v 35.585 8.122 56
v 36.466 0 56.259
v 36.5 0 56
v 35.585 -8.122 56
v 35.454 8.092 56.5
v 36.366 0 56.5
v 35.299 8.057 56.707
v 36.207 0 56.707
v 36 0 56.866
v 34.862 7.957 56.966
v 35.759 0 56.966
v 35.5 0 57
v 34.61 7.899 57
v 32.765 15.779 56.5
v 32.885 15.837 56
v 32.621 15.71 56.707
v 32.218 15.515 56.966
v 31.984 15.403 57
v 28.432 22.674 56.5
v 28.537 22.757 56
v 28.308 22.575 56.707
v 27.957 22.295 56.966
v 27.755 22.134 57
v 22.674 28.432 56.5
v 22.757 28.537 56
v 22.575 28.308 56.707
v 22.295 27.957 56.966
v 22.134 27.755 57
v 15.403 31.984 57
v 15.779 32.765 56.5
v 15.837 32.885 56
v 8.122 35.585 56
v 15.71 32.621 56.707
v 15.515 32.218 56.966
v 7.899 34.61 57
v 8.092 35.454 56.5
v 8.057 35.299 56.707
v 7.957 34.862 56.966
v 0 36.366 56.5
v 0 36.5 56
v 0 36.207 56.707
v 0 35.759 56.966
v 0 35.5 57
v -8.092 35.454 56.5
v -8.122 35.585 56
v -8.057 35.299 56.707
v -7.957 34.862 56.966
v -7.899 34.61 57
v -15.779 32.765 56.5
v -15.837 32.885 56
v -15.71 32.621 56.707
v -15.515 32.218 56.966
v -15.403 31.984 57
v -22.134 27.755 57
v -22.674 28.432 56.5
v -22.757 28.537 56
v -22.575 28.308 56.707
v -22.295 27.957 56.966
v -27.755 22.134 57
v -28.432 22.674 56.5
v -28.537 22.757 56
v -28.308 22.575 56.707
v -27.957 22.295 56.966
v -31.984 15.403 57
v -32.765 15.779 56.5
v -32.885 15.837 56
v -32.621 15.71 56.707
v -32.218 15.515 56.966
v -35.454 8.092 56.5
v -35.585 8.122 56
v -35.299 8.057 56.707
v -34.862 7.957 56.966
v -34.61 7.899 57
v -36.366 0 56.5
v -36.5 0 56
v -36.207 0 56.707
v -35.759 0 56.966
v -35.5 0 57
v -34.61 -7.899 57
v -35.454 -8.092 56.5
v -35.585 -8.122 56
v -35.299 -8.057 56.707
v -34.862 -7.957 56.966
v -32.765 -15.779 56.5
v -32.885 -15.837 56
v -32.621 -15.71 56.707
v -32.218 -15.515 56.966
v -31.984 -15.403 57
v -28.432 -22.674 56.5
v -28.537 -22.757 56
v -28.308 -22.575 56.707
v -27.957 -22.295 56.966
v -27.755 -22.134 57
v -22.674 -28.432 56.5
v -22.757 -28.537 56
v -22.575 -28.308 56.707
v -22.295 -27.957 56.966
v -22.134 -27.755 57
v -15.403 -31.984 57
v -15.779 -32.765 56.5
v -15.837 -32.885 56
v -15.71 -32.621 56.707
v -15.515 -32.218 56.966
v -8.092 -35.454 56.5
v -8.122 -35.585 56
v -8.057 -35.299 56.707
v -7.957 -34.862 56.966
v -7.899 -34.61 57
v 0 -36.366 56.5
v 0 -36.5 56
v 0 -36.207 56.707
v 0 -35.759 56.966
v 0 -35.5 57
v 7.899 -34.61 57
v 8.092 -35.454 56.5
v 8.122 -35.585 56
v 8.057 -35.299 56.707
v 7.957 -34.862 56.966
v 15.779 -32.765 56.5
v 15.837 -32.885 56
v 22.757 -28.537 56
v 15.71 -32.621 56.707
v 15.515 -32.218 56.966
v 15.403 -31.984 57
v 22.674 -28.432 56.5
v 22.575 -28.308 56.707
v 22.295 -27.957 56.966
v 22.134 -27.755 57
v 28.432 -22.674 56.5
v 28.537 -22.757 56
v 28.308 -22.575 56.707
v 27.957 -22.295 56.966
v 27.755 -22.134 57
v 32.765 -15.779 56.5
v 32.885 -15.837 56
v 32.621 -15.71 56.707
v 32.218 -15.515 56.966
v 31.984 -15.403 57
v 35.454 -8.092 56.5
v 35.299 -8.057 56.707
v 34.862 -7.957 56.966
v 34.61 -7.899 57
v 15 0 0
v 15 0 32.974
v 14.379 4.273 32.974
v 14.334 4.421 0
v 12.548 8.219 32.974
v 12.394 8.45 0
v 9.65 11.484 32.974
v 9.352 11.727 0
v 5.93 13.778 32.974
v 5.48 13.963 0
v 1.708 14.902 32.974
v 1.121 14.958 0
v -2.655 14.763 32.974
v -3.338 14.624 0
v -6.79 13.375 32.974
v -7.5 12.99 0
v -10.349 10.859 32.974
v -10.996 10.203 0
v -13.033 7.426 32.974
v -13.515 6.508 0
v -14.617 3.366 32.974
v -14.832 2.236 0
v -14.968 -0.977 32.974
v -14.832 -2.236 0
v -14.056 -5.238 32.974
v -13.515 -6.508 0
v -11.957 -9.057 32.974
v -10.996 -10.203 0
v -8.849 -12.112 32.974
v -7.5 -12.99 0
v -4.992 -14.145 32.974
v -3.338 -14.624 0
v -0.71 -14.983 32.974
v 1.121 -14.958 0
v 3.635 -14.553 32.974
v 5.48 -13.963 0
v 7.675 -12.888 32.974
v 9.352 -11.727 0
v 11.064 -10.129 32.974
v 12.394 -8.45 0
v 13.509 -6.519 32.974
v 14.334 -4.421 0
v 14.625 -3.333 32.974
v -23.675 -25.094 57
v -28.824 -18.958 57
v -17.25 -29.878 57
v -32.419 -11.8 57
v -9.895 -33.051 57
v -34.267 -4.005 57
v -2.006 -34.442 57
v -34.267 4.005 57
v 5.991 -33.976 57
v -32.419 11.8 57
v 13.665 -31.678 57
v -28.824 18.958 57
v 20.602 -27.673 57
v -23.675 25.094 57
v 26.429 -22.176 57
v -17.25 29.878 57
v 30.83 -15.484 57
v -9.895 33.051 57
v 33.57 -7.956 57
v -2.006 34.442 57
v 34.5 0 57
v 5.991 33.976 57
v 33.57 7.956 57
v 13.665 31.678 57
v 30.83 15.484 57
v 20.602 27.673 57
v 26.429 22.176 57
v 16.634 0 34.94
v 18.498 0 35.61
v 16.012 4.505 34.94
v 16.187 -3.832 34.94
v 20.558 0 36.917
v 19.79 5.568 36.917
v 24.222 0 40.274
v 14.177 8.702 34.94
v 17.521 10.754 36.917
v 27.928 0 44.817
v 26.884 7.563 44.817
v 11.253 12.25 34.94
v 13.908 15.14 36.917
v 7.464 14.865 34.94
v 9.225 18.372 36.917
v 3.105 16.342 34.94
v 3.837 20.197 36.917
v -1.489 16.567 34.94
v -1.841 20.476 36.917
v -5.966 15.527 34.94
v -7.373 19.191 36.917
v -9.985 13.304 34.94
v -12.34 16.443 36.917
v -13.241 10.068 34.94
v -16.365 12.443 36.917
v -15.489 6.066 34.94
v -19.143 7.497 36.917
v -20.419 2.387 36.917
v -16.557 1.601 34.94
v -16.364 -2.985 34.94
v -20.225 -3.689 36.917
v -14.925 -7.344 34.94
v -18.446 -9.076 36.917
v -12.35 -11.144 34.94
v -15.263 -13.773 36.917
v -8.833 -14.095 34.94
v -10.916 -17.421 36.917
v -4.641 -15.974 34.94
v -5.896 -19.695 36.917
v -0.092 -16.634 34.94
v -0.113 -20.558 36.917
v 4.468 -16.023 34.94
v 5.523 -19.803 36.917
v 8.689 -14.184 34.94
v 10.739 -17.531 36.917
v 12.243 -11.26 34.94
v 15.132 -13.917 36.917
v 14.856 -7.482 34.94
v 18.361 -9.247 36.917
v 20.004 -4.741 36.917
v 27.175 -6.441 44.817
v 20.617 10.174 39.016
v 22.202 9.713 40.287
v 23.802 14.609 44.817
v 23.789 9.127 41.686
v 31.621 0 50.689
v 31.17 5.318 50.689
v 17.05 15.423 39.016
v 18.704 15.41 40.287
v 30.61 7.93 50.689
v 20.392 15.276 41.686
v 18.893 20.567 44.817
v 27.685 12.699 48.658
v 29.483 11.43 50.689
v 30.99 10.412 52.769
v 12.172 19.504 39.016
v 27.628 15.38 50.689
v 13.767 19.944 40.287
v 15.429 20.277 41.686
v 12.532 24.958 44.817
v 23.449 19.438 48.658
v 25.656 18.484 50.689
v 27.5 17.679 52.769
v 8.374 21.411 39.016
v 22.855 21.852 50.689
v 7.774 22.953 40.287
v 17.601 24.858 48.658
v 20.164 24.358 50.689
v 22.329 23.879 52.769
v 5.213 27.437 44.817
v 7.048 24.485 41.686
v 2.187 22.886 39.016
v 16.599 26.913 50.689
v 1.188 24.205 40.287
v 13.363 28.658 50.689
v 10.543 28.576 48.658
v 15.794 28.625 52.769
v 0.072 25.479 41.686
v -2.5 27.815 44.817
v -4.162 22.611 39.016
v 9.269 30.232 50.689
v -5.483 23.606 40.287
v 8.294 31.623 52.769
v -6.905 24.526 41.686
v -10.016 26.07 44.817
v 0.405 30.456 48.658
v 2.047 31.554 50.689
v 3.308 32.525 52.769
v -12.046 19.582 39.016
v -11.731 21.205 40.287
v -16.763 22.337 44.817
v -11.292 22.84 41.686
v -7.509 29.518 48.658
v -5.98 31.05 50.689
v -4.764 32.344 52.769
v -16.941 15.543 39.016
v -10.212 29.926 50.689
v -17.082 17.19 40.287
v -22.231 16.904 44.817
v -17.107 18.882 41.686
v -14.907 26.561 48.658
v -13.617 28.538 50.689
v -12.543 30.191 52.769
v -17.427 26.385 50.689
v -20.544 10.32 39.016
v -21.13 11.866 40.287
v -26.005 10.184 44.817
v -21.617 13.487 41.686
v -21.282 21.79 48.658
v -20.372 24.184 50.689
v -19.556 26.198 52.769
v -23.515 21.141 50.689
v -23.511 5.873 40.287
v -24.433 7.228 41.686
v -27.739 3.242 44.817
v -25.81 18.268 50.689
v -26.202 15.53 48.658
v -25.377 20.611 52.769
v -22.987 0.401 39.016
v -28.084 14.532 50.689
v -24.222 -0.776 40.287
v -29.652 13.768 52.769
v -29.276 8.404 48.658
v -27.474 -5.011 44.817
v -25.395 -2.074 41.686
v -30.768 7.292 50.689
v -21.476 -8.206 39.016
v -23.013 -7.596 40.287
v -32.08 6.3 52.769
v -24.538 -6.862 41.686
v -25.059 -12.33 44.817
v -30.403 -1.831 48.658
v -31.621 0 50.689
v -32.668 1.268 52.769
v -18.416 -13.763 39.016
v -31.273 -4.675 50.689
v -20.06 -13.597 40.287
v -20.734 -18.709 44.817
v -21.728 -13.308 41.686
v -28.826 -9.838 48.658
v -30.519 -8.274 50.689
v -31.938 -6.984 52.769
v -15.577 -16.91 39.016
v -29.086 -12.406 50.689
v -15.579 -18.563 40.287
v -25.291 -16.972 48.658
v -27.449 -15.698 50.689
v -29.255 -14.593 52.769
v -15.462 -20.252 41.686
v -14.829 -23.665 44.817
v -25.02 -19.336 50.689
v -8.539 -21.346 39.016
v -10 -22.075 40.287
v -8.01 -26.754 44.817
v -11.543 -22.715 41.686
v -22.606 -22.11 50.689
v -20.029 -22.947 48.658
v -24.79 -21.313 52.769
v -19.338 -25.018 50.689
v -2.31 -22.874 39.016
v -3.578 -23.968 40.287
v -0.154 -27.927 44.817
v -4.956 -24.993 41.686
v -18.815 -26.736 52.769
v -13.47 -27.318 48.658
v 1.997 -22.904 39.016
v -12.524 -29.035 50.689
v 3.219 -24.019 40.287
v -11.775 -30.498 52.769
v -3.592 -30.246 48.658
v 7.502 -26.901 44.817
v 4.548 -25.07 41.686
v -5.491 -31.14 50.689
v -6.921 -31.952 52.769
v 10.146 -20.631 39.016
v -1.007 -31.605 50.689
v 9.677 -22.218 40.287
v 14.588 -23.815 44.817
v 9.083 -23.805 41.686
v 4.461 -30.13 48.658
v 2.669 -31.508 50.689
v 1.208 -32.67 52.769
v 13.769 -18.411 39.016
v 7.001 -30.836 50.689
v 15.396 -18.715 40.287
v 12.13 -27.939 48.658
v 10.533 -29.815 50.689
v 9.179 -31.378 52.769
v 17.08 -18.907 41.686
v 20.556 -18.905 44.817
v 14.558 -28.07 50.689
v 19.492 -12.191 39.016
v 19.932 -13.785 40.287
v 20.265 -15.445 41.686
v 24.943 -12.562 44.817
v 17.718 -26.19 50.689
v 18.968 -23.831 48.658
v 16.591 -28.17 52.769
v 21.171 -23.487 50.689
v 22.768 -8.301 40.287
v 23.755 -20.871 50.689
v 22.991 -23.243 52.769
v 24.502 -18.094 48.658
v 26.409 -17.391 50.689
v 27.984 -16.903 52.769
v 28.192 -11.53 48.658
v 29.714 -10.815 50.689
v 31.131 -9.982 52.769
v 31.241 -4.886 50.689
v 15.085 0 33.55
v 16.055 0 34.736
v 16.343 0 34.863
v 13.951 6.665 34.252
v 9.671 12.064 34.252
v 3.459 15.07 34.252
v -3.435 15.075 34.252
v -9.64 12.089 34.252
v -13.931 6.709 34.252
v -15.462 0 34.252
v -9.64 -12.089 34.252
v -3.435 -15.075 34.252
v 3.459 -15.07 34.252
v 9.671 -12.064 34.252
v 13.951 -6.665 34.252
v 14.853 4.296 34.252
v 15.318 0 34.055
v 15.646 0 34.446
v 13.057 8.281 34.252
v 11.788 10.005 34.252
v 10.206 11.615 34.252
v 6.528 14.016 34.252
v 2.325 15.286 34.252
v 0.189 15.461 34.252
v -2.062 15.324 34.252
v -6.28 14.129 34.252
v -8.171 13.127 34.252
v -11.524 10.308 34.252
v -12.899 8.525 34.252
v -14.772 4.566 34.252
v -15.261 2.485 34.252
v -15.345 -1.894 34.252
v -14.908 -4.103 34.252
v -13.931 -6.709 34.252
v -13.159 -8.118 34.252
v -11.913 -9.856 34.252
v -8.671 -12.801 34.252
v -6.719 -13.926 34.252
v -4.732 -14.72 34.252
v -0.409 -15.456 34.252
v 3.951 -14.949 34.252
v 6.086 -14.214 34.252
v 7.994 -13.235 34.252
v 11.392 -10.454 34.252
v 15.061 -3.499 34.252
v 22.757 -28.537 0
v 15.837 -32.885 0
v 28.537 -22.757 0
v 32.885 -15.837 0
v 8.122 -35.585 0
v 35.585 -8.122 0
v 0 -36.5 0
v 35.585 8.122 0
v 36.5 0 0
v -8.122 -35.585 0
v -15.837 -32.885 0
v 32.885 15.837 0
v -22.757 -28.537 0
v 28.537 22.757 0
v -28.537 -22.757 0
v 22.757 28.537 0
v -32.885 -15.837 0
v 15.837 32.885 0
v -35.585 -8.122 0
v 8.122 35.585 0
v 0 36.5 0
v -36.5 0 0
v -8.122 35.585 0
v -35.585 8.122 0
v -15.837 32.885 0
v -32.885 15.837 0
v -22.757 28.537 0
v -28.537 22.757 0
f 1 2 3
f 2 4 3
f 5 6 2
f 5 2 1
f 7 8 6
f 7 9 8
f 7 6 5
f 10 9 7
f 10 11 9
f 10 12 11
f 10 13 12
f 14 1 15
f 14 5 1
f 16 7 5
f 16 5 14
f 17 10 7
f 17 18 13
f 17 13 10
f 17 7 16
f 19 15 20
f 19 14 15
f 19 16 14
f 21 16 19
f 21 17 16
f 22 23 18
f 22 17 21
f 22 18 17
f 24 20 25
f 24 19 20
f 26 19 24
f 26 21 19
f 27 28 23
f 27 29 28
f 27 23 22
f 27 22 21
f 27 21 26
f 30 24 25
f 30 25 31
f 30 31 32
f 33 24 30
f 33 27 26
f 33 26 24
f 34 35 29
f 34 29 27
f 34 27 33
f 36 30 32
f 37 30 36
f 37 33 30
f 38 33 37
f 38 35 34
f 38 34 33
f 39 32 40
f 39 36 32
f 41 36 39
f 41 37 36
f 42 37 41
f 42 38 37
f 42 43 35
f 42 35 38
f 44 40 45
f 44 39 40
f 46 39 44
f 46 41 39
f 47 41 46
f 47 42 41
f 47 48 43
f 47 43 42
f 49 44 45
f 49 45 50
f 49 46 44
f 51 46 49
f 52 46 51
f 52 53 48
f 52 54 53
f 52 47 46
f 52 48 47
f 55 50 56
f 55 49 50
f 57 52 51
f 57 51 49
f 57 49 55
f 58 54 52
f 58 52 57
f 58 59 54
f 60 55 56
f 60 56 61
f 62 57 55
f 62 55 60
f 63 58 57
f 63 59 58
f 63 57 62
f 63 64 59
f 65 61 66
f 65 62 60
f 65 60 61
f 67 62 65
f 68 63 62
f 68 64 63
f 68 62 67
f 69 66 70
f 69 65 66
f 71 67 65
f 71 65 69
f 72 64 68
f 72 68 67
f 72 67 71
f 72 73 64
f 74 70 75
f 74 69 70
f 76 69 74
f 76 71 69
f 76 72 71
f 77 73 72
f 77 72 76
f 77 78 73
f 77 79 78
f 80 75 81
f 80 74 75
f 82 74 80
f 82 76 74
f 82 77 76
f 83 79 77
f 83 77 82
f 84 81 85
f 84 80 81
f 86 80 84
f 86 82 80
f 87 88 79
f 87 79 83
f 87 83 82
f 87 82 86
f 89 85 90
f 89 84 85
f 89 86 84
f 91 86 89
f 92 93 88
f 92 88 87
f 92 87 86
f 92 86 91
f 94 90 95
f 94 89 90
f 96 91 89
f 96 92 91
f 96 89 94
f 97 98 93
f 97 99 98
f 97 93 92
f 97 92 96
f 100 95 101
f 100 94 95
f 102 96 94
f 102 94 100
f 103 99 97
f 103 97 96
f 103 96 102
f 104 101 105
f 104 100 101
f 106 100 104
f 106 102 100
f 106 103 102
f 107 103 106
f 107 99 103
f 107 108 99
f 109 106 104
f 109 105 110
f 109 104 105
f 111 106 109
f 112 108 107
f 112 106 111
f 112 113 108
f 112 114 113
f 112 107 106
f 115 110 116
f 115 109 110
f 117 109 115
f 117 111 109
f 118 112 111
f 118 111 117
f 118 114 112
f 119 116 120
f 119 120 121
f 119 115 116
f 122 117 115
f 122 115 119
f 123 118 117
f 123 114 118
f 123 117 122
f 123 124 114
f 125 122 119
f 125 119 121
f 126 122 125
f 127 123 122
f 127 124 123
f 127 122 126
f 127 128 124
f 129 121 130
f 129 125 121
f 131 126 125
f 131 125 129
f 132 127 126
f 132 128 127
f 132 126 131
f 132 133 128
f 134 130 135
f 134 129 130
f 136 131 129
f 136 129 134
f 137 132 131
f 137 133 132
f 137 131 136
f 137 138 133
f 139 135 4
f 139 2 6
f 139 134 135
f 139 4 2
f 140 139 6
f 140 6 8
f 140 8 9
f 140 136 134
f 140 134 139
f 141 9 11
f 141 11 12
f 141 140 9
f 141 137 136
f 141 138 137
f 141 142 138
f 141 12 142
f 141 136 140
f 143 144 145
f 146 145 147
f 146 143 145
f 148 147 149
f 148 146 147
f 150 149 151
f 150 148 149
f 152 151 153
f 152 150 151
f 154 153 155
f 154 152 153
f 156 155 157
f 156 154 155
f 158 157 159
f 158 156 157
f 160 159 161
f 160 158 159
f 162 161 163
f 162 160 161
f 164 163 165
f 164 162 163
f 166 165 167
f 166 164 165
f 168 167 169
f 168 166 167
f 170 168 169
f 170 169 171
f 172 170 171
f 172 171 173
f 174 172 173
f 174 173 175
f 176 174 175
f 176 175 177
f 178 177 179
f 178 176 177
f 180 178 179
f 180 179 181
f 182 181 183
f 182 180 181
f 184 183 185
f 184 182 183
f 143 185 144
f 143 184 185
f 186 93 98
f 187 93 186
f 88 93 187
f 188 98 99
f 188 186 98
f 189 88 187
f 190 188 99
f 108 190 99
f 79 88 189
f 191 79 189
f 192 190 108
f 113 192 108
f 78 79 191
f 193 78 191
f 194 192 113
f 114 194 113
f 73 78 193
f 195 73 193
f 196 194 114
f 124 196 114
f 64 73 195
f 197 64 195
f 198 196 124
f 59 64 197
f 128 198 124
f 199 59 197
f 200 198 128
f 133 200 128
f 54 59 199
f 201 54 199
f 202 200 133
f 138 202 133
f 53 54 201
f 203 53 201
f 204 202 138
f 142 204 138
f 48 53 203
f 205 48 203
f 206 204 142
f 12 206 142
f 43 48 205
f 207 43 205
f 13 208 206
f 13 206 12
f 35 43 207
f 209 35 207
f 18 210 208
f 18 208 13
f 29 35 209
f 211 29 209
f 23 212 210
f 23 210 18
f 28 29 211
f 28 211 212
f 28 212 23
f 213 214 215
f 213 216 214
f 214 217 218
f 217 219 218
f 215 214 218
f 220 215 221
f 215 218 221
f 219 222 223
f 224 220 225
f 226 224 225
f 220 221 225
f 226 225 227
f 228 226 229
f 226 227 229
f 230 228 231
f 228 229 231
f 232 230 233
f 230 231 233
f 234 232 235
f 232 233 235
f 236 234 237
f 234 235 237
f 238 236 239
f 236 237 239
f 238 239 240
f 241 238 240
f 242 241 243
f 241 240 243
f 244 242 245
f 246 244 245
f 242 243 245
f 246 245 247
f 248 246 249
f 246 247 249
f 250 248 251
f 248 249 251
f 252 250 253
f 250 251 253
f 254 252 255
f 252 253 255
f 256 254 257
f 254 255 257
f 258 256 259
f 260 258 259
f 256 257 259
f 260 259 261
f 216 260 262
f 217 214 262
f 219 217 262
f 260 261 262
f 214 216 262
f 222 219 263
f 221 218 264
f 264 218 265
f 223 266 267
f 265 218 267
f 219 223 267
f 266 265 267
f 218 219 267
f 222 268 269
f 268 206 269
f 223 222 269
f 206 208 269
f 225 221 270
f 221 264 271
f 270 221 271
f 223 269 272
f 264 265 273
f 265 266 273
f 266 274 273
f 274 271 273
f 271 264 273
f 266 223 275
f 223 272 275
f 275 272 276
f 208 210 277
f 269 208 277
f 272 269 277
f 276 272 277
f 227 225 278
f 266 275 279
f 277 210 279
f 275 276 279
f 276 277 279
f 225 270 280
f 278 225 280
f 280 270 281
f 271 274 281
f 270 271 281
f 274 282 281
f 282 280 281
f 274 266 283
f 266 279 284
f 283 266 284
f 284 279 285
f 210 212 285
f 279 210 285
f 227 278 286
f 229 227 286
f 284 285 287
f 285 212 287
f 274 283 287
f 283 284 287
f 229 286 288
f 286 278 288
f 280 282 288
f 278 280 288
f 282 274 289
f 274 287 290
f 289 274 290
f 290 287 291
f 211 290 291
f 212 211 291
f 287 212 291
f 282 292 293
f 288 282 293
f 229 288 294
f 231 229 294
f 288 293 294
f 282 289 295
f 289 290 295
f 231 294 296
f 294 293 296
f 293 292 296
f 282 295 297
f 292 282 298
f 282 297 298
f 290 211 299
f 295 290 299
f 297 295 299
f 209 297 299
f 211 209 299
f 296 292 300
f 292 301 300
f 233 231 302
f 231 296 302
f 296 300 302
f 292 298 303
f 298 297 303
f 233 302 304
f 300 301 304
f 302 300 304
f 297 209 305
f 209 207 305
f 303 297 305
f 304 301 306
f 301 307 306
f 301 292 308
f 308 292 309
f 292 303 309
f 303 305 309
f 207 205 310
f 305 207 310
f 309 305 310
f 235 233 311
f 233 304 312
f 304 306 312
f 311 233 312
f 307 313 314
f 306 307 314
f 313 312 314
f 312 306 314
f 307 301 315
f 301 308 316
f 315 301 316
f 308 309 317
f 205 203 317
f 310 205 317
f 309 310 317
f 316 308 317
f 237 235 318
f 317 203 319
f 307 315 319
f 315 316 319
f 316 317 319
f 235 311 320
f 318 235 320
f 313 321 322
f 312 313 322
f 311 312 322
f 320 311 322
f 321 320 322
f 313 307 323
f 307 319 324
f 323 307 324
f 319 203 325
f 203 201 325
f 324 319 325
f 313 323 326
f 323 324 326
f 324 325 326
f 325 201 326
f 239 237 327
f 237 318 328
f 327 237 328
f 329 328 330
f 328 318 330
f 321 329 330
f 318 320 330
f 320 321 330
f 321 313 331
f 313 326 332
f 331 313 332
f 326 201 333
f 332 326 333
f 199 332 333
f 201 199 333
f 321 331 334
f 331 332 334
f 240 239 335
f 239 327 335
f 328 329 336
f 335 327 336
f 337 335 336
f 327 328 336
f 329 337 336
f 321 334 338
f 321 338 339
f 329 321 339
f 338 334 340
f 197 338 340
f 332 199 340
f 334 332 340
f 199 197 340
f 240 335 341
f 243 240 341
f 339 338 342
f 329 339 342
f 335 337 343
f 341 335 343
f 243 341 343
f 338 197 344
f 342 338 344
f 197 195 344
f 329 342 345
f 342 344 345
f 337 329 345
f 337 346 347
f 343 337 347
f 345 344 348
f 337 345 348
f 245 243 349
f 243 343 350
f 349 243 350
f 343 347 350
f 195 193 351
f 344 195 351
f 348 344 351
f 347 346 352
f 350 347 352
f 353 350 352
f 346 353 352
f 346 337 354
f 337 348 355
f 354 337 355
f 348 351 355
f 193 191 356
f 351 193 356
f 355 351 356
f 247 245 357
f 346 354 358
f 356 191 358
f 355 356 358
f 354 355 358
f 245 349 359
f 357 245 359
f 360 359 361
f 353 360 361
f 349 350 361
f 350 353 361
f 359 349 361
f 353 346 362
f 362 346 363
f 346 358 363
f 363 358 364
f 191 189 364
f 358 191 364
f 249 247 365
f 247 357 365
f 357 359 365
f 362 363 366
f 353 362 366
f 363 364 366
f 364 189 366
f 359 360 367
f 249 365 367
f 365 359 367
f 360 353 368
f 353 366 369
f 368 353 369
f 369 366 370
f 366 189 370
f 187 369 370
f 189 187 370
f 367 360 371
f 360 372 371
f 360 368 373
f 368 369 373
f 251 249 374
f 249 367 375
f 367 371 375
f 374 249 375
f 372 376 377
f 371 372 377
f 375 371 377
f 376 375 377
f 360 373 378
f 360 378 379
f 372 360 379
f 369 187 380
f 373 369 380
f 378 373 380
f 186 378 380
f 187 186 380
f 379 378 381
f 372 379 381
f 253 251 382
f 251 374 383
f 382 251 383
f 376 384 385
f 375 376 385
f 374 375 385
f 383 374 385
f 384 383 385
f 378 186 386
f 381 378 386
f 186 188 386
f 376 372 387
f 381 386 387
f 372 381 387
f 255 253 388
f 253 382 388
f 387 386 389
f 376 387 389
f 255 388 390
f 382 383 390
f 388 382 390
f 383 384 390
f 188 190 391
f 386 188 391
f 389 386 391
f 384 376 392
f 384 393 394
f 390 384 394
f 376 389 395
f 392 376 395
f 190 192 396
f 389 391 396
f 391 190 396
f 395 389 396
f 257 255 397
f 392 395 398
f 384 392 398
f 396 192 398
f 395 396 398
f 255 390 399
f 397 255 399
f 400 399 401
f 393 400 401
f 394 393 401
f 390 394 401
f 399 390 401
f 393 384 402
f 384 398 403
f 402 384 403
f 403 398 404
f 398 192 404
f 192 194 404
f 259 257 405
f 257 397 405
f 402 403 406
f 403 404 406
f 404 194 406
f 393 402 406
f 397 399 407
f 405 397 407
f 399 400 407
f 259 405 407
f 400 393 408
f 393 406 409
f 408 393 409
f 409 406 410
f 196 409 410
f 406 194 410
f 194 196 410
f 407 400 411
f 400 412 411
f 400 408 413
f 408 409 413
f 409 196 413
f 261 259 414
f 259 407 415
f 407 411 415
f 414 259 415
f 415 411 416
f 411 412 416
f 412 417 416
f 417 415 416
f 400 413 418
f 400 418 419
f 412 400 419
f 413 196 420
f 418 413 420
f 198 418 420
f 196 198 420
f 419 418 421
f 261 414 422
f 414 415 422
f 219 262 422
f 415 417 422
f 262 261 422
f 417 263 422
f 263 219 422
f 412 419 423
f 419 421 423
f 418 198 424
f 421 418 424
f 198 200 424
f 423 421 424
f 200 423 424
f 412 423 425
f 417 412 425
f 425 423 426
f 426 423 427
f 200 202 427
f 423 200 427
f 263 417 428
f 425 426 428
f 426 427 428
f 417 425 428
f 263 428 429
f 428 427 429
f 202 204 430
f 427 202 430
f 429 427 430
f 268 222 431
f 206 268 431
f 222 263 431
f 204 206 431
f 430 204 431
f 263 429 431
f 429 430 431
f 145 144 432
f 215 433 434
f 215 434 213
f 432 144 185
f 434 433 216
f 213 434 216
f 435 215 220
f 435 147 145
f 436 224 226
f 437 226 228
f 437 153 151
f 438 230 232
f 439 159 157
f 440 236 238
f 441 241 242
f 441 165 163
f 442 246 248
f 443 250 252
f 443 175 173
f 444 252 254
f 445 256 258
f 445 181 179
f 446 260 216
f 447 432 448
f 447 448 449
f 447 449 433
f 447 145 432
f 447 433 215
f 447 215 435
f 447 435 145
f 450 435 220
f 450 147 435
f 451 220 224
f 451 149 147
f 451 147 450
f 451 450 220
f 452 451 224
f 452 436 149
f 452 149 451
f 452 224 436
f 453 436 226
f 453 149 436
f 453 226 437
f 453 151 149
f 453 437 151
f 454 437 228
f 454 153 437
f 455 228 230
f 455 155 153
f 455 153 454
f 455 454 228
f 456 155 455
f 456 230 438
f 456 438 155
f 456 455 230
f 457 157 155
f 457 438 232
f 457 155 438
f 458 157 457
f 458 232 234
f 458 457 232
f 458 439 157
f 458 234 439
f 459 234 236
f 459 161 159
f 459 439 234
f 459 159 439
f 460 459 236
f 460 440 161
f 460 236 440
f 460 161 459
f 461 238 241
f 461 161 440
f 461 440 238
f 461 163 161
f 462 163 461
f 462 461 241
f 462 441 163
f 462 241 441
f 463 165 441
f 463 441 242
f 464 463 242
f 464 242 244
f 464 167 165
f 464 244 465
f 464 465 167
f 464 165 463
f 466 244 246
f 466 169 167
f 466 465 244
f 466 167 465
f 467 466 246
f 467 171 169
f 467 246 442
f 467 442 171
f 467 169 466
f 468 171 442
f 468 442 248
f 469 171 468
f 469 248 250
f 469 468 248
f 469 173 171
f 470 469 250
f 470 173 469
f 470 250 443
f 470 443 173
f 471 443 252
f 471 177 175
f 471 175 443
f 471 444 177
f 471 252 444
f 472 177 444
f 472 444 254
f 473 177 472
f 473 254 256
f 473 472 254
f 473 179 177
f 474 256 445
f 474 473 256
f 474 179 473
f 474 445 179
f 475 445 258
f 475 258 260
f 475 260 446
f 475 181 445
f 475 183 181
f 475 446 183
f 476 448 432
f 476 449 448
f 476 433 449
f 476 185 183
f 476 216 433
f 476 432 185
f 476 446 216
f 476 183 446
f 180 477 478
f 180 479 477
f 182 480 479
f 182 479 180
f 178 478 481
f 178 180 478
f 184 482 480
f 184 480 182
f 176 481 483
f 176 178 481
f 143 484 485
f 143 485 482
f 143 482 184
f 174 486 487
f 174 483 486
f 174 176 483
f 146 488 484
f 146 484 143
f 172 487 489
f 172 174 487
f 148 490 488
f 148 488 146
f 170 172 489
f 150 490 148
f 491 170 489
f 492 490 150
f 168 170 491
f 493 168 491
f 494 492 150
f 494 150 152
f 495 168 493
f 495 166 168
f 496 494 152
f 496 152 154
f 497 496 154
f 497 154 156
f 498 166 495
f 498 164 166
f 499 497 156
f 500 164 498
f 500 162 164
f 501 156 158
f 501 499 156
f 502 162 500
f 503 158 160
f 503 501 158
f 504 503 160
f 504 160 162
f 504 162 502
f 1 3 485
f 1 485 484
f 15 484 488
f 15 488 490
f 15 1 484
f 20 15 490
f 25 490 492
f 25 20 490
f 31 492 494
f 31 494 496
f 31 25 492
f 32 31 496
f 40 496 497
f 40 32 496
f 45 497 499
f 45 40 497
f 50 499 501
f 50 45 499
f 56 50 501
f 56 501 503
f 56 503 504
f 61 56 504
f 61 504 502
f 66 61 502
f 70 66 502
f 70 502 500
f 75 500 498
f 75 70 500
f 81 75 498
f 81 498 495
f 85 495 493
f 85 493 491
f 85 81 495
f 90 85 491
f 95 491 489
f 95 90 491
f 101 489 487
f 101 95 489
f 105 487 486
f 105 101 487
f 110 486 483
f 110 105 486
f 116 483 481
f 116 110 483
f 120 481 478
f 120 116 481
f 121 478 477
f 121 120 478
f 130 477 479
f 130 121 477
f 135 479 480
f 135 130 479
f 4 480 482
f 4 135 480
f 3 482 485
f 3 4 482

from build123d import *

# Parameters (mm, degrees)
F2_R = 2
F3_R = 1


with BuildPart() as f1:
    # F0 (on Front) → F1 (revolve)
    with BuildSketch(Plane.XZ):
        with BuildLine():
            Line((15, 35), (15, 0))
            Line((15, 0), (36.5, 0))
            Line((36.5, 0), (36.5, 57))
            Line((36.5, 57), (34.5, 57))
            add(Edge.make_bspline(
                [(15, 35), (19.786455, 33.476222), (30.260691, 45.408688), (34.5, 57)],
                knots=[0, 0, 0, 0, 29.398129, 29.398129, 29.398129, 29.398129], degree=3))
        make_face()
    revolve(axis=Axis((0, 0, 19.474553), (0, 0, 1)))

    # F2
    f2_edges = [f1.edges().sort_by_distance(p)[0] for p in [
        (-15, 0, 35),
    ]]
    fillet(f2_edges, radius=F2_R)

    # F3
    f3_edges = [f1.edges().sort_by_distance(p)[0] for p in [
        (-36.5, 0, 57),
    ]]
    fillet(f3_edges, radius=F3_R)


solid = f1.part
